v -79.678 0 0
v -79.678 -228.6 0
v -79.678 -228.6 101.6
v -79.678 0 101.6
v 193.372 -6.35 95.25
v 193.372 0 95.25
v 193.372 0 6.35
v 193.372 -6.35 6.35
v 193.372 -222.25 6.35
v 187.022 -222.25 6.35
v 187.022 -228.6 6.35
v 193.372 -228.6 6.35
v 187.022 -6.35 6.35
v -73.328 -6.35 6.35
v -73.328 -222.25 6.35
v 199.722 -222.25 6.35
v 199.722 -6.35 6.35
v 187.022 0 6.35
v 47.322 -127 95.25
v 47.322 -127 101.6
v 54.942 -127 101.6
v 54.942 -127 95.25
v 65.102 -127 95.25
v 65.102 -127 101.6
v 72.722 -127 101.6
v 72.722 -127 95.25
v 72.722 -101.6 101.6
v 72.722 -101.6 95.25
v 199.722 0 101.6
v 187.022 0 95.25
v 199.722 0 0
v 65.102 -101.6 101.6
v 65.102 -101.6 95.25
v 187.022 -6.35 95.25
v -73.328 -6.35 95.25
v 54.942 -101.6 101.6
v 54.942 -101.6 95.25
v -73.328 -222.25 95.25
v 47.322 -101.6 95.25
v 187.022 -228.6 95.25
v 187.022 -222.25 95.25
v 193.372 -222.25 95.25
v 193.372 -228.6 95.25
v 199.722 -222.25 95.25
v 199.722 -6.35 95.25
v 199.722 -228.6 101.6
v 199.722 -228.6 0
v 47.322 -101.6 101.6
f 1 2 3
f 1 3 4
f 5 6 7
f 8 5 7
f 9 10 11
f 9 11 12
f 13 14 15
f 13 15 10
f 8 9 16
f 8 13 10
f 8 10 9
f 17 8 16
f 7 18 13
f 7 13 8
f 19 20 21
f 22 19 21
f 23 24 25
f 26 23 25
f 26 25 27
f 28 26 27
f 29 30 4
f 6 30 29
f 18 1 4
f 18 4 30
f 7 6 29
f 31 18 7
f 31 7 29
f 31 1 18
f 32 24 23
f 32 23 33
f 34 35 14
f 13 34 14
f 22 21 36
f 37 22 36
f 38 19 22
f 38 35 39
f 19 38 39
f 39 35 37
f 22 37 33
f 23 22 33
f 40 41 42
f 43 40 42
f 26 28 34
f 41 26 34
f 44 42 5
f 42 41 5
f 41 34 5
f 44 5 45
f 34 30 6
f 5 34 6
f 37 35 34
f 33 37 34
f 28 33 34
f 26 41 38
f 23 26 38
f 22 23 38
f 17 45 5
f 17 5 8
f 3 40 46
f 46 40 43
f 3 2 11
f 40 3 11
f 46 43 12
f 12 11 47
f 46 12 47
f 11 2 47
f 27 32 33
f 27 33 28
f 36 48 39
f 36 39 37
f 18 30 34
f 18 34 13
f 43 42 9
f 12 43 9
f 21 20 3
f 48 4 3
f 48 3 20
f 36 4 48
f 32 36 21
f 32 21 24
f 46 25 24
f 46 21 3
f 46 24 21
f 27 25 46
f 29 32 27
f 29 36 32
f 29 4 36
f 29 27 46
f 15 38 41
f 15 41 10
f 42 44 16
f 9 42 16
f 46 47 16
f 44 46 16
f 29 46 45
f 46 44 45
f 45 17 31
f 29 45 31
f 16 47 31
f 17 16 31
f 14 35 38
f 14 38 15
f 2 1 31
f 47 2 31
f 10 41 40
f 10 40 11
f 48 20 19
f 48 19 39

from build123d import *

# Parameters (mm, degrees)
MAIN_BODY_W                        = 279.4
MAIN_BODY_H                        = 228.6
MAIN_BODY_EXTRUDE_DEPTH            = 101.6
SKETCH2_W                          = 88.9
SKETCH2_H                          = 215.9
MAIN_BODY_HOLLOW_EXTRUDE_CUT_DEPTH = 273.05
SKETCH3_W                          = 6.35
SKETCH3_H                          = 88.9
SLIDING_DOOR_EXTRUDE_CUT_DEPTH     = 273.05
SKETCH4_W                          = 7.62
SKETCH4_H                          = 25.4
CUT_EXTRUDE3_DEPTH                 = 25.4


with BuildPart() as part:
    # Main Body → Main Body Extrude (new body)
    with BuildSketch(Plane.XY):
        with Locations((60.02161481, -114.3)):
            Rectangle(MAIN_BODY_W, MAIN_BODY_H)
    extrude(amount=MAIN_BODY_EXTRUDE_DEPTH)

    # Sketch2 → Main Body Hollow Extrude Cut (cut)
    with BuildSketch(Plane(origin=(199.72161481, 0, 0), x_dir=(0, 0, -1), z_dir=(1, 0, 0))):
        with Locations((-50.8, -114.3)):
            Rectangle(SKETCH2_W, SKETCH2_H)
    extrude(amount=-MAIN_BODY_HOLLOW_EXTRUDE_CUT_DEPTH, mode=Mode.SUBTRACT)

    # Sketch3 → Sliding Door Extrude Cut (cut)
    with BuildSketch(Plane(origin=(0, 0, 0), x_dir=(1, 0, 0), z_dir=(0, 1, 0))):
        with Locations((190.19661481, -50.8)):
            Rectangle(SKETCH3_W, SKETCH3_H)
    extrude(amount=-SLIDING_DOOR_EXTRUDE_CUT_DEPTH, mode=Mode.SUBTRACT)

    # Sketch4 → Cut-Extrude3 (cut)
    with BuildSketch(Plane.XY.offset(101.6)):
        with Locations((51.13161481, -114.3)):
            Rectangle(SKETCH4_W, SKETCH4_H)
        with Locations((68.91161481, -114.3)):
            Rectangle(SKETCH4_W, SKETCH4_H)
    extrude(amount=-CUT_EXTRUDE3_DEPTH, mode=Mode.SUBTRACT)


solid = part.part
